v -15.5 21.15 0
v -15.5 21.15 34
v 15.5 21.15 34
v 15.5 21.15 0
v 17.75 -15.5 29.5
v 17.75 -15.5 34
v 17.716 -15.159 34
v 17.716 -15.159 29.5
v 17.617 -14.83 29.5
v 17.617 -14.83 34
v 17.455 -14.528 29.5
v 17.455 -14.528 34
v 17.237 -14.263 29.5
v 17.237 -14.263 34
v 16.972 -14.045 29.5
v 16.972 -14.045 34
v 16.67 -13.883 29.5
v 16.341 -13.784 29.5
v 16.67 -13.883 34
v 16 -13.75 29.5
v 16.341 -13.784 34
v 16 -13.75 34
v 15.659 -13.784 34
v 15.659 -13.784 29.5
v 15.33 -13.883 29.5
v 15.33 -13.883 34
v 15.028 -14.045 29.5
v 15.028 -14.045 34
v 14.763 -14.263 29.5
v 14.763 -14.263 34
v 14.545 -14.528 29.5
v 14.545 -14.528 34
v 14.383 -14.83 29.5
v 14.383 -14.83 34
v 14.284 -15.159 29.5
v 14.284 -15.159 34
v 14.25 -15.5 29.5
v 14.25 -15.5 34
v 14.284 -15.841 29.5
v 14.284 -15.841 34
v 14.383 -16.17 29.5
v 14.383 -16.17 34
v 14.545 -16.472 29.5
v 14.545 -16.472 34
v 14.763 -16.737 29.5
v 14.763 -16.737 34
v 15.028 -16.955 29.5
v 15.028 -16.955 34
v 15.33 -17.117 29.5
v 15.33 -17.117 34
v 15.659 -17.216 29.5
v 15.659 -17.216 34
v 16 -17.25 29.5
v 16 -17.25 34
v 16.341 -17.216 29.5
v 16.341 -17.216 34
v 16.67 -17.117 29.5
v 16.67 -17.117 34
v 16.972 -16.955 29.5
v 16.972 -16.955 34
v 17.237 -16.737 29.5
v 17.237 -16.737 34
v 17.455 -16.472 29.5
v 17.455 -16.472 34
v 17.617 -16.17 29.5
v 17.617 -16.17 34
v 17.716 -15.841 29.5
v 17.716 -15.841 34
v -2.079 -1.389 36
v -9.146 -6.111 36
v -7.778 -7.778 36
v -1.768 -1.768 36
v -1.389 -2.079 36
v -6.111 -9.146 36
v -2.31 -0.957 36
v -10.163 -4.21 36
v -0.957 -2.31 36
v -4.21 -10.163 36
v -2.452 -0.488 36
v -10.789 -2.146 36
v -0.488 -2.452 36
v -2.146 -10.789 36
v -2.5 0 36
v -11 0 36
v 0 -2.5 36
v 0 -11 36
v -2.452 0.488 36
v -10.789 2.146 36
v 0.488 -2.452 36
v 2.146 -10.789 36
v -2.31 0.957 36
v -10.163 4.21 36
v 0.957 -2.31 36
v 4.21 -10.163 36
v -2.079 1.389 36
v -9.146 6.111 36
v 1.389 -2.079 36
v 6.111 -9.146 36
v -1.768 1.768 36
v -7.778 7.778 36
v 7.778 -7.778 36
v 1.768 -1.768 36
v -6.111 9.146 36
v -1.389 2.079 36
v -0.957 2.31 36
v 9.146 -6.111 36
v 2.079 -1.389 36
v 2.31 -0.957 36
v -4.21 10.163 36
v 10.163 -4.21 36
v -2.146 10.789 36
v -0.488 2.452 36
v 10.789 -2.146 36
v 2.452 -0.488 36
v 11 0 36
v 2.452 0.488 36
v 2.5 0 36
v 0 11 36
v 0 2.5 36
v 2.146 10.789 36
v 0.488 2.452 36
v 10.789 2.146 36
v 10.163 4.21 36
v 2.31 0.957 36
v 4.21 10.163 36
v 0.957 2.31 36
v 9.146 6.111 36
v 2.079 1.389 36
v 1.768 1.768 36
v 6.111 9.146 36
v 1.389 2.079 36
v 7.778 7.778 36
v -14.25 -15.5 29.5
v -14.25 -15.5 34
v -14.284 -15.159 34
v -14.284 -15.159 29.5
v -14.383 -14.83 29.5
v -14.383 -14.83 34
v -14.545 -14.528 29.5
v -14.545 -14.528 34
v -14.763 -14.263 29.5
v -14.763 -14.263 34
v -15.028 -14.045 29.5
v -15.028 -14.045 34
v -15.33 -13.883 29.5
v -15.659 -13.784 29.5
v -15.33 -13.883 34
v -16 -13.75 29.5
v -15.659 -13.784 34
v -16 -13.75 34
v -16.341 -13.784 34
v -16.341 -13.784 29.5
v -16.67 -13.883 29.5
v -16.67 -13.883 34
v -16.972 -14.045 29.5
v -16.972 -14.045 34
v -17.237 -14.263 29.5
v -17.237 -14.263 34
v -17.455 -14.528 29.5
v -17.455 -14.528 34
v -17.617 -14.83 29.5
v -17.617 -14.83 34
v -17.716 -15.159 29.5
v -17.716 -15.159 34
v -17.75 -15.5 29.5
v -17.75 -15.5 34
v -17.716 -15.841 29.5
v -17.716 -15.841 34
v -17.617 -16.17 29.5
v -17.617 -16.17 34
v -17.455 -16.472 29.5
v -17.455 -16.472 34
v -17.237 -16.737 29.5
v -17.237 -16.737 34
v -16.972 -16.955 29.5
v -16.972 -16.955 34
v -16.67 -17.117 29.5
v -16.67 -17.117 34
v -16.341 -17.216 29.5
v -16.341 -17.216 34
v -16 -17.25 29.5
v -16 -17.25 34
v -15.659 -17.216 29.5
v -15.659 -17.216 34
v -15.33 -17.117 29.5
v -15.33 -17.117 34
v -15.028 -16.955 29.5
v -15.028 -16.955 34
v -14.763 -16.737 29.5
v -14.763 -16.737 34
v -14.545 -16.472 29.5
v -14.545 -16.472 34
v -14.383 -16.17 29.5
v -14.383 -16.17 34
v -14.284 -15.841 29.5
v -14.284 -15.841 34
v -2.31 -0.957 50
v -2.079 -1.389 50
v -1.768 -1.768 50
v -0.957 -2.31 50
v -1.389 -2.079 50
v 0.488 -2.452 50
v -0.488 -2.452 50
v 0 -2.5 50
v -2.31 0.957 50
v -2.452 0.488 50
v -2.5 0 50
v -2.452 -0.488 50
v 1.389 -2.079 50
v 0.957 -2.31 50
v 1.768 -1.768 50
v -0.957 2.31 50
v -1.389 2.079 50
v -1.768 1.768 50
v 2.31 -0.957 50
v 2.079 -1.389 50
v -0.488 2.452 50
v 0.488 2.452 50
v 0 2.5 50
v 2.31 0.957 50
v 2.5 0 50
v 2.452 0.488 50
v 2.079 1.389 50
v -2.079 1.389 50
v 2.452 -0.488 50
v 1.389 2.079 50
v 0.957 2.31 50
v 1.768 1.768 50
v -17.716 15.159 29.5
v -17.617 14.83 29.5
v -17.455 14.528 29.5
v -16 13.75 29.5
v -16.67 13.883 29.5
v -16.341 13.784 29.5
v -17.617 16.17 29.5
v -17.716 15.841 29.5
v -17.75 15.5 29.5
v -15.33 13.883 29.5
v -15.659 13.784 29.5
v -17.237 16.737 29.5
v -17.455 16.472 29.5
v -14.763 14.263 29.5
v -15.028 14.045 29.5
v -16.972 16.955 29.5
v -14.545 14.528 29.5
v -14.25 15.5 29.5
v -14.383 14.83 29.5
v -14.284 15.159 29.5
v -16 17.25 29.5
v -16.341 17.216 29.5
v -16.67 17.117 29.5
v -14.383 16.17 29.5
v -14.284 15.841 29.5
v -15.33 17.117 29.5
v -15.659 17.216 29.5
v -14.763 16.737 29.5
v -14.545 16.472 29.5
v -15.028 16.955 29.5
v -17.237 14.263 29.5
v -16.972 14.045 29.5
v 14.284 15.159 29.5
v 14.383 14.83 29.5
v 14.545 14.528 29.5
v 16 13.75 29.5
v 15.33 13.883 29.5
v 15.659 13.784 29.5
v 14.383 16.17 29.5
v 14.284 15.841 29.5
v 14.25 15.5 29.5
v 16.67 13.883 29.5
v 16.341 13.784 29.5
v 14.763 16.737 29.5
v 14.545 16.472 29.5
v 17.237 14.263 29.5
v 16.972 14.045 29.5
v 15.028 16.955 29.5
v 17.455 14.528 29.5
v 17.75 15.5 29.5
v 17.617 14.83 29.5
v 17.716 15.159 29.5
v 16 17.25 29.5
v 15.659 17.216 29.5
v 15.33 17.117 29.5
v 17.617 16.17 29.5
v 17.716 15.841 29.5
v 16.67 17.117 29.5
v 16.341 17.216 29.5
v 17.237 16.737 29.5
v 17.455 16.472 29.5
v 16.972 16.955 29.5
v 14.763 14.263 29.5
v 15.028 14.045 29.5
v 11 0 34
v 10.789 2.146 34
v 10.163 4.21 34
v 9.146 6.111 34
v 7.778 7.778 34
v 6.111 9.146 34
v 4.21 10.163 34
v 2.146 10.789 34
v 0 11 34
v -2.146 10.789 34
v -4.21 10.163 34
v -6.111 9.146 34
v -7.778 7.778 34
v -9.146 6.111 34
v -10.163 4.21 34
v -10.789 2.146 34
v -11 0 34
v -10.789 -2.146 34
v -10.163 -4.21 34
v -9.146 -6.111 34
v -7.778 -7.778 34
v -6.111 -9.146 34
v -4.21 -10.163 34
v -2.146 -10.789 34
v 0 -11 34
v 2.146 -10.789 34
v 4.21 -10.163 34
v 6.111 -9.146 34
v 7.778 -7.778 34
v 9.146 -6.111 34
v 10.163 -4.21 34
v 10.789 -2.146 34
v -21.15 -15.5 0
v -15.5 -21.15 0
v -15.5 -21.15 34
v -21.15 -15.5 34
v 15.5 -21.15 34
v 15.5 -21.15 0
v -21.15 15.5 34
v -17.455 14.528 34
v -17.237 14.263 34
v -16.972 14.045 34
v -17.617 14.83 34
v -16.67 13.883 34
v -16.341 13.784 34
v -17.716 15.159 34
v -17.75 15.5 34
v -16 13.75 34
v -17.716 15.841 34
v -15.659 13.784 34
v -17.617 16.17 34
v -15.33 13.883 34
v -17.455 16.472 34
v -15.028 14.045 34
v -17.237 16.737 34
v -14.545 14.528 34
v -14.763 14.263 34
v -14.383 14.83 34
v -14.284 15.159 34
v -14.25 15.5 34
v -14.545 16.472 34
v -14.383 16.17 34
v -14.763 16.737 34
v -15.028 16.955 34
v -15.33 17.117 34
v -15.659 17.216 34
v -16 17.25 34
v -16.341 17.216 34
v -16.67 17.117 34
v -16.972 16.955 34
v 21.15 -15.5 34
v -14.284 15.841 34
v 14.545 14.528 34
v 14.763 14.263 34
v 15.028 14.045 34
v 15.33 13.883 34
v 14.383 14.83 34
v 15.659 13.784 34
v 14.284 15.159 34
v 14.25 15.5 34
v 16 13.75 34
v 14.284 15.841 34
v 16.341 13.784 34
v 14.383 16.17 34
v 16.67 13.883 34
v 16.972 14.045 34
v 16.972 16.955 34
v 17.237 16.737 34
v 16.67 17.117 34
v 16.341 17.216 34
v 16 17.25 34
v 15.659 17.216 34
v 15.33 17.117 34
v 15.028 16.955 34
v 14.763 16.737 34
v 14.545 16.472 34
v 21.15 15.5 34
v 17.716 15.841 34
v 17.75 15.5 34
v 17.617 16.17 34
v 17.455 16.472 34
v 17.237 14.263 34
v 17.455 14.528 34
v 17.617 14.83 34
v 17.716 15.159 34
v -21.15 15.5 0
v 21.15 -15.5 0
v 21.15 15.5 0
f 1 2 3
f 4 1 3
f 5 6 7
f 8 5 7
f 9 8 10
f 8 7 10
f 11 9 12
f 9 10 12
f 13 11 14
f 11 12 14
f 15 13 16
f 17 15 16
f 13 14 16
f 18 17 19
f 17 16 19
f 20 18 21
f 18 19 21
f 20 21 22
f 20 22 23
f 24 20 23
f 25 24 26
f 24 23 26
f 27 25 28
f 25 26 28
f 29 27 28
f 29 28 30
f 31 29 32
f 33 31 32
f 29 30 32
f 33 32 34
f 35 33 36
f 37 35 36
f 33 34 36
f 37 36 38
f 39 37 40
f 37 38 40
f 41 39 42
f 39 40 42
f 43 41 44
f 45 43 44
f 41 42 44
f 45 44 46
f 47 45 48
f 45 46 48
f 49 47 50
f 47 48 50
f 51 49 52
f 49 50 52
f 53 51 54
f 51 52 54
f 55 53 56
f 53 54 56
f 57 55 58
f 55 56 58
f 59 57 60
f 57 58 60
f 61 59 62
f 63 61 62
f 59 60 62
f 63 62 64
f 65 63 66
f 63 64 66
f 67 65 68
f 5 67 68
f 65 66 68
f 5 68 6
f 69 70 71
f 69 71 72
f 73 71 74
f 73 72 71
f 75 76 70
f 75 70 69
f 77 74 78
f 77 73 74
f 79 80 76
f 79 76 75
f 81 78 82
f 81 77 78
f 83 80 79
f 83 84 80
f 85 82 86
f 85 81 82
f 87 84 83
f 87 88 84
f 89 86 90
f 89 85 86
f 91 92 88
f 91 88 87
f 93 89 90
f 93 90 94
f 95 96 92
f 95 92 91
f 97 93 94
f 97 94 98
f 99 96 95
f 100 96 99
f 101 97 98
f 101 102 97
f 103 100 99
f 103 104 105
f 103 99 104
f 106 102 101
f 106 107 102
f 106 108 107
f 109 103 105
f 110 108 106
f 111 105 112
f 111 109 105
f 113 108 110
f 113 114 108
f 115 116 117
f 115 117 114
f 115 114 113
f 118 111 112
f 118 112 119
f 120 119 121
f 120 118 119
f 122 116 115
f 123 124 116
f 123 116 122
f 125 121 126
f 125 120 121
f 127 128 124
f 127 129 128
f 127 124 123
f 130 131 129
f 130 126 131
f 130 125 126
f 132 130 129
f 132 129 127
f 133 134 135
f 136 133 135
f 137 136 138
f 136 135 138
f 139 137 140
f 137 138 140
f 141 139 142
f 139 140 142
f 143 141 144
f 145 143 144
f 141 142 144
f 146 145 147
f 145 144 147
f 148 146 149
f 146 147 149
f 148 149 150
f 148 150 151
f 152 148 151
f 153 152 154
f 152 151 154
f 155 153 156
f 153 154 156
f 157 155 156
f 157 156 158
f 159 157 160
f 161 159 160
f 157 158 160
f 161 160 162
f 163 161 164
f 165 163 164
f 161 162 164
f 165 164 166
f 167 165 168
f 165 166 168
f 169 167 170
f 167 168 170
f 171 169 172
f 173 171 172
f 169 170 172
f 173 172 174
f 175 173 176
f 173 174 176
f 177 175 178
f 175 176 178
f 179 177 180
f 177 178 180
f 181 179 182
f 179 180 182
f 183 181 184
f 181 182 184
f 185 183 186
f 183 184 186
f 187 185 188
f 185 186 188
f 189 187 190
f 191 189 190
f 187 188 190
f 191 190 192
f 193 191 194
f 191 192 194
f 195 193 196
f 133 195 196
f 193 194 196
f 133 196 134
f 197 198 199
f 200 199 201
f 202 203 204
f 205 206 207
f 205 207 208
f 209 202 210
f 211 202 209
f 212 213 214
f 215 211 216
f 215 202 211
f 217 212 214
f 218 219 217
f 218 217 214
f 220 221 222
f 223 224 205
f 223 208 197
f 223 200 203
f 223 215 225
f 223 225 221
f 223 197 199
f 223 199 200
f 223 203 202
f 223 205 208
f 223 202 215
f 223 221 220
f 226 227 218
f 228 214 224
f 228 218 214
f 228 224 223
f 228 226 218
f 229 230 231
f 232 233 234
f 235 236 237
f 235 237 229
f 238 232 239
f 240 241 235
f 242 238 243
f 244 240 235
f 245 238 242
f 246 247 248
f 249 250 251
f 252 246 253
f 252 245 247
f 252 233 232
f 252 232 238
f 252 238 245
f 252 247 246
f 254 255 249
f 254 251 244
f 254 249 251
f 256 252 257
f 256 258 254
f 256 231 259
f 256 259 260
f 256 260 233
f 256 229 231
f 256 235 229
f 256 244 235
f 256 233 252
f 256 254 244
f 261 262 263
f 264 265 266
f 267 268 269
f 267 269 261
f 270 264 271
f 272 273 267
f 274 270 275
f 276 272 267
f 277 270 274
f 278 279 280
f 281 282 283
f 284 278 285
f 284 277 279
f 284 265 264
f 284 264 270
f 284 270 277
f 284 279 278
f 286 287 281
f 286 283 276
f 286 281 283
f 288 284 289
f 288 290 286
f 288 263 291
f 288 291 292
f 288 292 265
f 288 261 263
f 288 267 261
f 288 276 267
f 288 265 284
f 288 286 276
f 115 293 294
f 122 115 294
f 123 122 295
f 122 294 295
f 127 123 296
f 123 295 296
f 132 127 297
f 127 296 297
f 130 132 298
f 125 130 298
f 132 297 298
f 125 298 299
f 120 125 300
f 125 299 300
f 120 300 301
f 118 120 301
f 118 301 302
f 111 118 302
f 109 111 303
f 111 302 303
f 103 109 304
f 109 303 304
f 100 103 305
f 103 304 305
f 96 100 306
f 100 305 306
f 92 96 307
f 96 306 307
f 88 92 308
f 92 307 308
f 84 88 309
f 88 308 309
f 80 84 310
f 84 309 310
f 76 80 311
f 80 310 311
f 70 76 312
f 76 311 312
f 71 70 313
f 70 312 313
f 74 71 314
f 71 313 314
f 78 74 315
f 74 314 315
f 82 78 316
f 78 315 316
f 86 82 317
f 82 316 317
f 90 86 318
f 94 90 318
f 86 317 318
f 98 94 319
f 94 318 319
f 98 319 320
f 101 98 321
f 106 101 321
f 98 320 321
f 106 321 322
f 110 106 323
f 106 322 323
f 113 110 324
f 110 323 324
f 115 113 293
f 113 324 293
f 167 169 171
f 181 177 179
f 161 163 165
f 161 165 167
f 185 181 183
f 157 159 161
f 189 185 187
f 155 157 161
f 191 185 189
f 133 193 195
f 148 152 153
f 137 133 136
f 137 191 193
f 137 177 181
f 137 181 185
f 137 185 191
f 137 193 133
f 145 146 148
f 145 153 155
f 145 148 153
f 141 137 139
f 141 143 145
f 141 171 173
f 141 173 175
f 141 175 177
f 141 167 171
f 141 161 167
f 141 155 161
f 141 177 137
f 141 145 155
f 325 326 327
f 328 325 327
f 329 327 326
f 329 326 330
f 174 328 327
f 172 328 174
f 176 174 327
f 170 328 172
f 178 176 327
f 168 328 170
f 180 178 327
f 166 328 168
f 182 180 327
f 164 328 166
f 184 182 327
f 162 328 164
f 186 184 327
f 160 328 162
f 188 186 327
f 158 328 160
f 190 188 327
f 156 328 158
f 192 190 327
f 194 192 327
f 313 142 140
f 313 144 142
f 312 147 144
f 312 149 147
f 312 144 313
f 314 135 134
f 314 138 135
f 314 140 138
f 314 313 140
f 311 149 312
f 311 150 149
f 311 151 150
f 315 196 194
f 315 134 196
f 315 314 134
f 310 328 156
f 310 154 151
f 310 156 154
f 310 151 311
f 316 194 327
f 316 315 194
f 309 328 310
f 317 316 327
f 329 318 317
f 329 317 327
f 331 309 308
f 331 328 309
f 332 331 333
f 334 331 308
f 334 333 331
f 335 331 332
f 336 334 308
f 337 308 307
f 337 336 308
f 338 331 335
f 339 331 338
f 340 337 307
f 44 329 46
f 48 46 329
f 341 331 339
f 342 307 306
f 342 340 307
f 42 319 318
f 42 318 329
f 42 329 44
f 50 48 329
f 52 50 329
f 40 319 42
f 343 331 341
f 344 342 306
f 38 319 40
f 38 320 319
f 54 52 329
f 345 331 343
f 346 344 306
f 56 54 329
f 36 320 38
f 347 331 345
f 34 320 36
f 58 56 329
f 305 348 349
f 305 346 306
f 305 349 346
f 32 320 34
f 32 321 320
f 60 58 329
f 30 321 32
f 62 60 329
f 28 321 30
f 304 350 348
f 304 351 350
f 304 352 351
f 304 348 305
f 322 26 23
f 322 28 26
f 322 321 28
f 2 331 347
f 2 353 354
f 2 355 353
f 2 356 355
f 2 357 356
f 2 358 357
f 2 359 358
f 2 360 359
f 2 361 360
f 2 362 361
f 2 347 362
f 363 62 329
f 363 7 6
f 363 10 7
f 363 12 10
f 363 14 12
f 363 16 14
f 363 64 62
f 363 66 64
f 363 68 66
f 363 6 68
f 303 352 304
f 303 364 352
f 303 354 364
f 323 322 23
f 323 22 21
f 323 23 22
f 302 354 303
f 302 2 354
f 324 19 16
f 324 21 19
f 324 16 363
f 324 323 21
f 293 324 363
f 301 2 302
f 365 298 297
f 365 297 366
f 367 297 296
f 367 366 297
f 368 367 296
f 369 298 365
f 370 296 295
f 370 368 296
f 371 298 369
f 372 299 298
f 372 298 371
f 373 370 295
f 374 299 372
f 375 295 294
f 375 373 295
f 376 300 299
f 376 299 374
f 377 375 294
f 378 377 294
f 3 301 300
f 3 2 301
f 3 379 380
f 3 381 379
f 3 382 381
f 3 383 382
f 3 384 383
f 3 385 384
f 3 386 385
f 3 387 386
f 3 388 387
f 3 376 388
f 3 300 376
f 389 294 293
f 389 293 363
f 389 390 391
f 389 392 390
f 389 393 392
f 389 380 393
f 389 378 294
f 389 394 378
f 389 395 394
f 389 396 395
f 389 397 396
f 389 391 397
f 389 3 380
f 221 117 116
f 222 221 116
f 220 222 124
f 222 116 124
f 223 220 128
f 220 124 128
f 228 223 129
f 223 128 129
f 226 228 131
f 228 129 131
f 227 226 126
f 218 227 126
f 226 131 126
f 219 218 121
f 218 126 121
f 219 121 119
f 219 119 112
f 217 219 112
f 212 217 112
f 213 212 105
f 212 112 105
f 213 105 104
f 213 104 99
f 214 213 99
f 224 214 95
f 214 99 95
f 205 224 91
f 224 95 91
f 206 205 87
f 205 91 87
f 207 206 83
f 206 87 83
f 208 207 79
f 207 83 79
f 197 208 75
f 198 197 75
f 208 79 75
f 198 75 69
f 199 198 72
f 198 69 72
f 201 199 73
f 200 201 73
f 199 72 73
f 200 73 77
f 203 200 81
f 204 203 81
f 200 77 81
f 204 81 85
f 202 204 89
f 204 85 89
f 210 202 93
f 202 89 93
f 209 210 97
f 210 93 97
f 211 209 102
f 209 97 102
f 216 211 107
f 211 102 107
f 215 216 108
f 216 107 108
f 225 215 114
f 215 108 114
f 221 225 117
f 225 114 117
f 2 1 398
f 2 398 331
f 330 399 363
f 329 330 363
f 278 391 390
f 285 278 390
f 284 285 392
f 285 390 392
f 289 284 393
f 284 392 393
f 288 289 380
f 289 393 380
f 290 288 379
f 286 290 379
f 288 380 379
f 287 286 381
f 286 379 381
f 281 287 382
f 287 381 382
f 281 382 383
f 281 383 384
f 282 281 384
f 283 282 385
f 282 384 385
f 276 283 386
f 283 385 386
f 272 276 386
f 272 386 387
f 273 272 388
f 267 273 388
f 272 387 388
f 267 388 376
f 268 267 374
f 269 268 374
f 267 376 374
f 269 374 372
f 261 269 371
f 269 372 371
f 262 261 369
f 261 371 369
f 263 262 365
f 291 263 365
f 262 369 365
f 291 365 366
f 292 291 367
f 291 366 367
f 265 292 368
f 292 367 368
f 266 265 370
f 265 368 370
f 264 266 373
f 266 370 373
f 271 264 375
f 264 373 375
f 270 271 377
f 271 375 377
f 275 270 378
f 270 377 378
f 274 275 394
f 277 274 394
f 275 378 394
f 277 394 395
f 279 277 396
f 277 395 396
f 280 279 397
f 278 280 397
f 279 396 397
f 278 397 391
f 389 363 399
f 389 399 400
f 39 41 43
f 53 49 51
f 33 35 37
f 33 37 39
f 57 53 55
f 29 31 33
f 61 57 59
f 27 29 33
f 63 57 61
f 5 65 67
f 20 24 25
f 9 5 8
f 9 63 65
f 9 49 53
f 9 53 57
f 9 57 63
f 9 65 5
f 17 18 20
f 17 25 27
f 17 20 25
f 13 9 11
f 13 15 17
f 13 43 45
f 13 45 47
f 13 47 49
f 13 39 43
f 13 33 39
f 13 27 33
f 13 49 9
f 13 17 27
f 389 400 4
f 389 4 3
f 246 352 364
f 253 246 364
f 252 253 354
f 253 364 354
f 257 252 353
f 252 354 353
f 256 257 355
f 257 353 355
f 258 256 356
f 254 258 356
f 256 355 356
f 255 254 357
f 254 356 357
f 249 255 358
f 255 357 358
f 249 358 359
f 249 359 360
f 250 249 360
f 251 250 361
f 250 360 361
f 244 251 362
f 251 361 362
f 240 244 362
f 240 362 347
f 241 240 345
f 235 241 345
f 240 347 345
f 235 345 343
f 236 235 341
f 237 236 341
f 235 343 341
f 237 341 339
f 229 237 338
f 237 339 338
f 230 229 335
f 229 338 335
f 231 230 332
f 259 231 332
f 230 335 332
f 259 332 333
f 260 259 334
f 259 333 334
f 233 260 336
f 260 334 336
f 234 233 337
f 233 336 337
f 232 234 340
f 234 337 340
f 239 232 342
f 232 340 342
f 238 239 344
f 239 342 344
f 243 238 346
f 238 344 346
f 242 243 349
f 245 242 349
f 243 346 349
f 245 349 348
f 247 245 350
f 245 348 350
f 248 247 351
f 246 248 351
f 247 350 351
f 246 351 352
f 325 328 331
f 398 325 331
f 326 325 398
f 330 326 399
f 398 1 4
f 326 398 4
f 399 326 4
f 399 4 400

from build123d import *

# Parameters (mm, degrees)
F0_W     = 42.3
F0_H     = 42.3
F1_DEPTH = 34
F2_R     = 11
F3_DEPTH = 2
F4_R     = 2.5
F5_DEPTH = 14
F6_SIZE  = 5.65
F7_R     = 1.75
F8_DEPTH = 4.5


with BuildPart() as f1:
    # F0 (on Top) → F1 (new body)
    with BuildSketch(Plane.XY):
        Rectangle(F0_W, F0_H)
    extrude(amount=F1_DEPTH)

    # F2 (on face) → F3 (join)
    with BuildSketch(Plane.XY.offset(34)):
        Circle(F2_R)
    extrude(amount=F3_DEPTH)

    # F4 (on face) → F5 (join)
    with BuildSketch(Plane.XY.offset(36)):
        Circle(F4_R)
    extrude(amount=F5_DEPTH)

    # F6
    f6_edges = [f1.edges().sort_by_distance(p)[0] for p in [
        (21.15, 21.15, 17),
        (-21.15, 21.15, 17),
        (21.15, -21.15, 17),
        (-21.15, -21.15, 17),
    ]]
    chamfer(f6_edges, length=F6_SIZE)

    # F7 (on face) → F8 (cut)
    with BuildSketch(Plane.XY.offset(34)):
        with Locations((16, 15.5)):
            Circle(F7_R)
        with Locations((-16, 15.5)):
            Circle(F7_R)
        with Locations((16, -15.5)):
            Circle(F7_R)
        with Locations((-16, -15.5)):
            Circle(F7_R)
    extrude(amount=-F8_DEPTH, mode=Mode.SUBTRACT)


solid = f1.part
